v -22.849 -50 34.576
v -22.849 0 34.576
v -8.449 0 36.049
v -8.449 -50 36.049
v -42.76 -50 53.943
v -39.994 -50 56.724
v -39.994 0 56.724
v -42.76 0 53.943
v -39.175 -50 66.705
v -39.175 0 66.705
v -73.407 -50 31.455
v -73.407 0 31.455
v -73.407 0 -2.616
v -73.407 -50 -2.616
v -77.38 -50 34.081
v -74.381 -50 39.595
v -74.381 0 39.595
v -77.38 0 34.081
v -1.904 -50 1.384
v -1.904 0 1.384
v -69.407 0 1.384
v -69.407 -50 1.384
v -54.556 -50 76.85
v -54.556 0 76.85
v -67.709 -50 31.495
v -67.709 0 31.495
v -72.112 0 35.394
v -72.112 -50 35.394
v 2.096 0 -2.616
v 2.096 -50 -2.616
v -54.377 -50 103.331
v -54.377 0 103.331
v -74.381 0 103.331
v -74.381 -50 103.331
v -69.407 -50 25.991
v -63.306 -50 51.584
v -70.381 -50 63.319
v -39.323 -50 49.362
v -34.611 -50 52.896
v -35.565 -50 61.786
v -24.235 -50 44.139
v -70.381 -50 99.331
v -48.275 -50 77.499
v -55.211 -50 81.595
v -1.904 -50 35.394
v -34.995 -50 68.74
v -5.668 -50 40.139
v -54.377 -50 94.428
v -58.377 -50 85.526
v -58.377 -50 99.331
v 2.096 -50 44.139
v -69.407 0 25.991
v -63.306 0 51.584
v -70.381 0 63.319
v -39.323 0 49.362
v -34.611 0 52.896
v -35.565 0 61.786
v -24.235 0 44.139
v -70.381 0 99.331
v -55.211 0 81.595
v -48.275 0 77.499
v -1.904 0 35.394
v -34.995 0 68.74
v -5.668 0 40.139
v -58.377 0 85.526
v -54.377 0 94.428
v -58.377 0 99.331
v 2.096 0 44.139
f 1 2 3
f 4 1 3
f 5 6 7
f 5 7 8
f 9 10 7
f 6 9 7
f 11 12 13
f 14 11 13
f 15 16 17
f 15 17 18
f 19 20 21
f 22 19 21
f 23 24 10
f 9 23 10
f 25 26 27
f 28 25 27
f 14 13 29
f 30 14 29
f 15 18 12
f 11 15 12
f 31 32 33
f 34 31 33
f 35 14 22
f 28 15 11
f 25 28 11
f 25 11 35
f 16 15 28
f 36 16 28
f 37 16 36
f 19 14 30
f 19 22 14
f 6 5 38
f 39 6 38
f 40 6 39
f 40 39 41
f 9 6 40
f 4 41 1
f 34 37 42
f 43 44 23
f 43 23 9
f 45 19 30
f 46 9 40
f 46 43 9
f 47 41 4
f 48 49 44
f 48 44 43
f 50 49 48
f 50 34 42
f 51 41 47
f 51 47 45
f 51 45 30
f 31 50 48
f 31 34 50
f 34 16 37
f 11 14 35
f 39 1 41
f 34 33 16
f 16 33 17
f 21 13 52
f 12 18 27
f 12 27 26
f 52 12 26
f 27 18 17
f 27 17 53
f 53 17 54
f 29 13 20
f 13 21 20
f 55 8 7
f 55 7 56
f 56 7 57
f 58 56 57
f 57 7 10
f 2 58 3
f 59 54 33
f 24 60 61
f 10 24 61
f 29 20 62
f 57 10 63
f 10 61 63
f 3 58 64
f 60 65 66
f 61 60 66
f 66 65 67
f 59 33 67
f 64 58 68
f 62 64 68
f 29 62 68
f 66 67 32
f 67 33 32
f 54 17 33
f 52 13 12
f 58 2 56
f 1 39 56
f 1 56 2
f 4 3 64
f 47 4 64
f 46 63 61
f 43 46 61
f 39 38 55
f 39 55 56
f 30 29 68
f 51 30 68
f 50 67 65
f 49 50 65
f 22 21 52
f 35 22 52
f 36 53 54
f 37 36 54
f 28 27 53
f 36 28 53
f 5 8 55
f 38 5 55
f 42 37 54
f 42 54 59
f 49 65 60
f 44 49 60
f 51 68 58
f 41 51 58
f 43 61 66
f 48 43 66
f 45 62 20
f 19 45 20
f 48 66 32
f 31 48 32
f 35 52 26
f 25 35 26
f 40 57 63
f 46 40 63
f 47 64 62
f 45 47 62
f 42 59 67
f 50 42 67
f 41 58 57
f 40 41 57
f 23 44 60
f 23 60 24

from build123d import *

# Parameters (mm, degrees)
F1_DEPTH = 50


with BuildPart() as f1:
    # F0 (on Front) → F1 (new body)
    with BuildSketch(Plane.XZ):
        Polygon((-54.376826, 94.42836), (-54.376826, 103.330544), (-74.380621, 103.330544), (-74.380621, 39.594981), (-77.379836, 34.080958), (-73.407053, 31.455231), (-73.407053, -2.616242), (2.095642, -2.616242), (2.095642, 44.139318), (-24.235287, 44.139318), (-35.565158, 61.786109), (-34.995204, 68.73957), (-48.275114, 77.498662), align=None)
        Polygon((-63.30613, 51.583886), (-70.380621, 63.319154), (-70.380621, 99.330544), (-58.376826, 99.330544), (-58.376826, 85.526176), (-55.210922, 81.59513), (-54.556411, 76.849923), (-39.175387, 66.704988), (-39.993525, 56.723688), (-42.759668, 53.943455), (-39.323483, 49.361873), (-34.610999, 52.896235), (-22.848731, 34.575965), (-8.449475, 36.048617), (-5.667799, 40.139318), (-1.904358, 35.394106), (-1.904358, 1.383758), (-69.407053, 1.383758), (-69.407053, 25.991378), (-67.709148, 31.495143), (-72.112158, 35.394106), align=None, mode=Mode.SUBTRACT)
    extrude(amount=F1_DEPTH)


solid = f1.part
